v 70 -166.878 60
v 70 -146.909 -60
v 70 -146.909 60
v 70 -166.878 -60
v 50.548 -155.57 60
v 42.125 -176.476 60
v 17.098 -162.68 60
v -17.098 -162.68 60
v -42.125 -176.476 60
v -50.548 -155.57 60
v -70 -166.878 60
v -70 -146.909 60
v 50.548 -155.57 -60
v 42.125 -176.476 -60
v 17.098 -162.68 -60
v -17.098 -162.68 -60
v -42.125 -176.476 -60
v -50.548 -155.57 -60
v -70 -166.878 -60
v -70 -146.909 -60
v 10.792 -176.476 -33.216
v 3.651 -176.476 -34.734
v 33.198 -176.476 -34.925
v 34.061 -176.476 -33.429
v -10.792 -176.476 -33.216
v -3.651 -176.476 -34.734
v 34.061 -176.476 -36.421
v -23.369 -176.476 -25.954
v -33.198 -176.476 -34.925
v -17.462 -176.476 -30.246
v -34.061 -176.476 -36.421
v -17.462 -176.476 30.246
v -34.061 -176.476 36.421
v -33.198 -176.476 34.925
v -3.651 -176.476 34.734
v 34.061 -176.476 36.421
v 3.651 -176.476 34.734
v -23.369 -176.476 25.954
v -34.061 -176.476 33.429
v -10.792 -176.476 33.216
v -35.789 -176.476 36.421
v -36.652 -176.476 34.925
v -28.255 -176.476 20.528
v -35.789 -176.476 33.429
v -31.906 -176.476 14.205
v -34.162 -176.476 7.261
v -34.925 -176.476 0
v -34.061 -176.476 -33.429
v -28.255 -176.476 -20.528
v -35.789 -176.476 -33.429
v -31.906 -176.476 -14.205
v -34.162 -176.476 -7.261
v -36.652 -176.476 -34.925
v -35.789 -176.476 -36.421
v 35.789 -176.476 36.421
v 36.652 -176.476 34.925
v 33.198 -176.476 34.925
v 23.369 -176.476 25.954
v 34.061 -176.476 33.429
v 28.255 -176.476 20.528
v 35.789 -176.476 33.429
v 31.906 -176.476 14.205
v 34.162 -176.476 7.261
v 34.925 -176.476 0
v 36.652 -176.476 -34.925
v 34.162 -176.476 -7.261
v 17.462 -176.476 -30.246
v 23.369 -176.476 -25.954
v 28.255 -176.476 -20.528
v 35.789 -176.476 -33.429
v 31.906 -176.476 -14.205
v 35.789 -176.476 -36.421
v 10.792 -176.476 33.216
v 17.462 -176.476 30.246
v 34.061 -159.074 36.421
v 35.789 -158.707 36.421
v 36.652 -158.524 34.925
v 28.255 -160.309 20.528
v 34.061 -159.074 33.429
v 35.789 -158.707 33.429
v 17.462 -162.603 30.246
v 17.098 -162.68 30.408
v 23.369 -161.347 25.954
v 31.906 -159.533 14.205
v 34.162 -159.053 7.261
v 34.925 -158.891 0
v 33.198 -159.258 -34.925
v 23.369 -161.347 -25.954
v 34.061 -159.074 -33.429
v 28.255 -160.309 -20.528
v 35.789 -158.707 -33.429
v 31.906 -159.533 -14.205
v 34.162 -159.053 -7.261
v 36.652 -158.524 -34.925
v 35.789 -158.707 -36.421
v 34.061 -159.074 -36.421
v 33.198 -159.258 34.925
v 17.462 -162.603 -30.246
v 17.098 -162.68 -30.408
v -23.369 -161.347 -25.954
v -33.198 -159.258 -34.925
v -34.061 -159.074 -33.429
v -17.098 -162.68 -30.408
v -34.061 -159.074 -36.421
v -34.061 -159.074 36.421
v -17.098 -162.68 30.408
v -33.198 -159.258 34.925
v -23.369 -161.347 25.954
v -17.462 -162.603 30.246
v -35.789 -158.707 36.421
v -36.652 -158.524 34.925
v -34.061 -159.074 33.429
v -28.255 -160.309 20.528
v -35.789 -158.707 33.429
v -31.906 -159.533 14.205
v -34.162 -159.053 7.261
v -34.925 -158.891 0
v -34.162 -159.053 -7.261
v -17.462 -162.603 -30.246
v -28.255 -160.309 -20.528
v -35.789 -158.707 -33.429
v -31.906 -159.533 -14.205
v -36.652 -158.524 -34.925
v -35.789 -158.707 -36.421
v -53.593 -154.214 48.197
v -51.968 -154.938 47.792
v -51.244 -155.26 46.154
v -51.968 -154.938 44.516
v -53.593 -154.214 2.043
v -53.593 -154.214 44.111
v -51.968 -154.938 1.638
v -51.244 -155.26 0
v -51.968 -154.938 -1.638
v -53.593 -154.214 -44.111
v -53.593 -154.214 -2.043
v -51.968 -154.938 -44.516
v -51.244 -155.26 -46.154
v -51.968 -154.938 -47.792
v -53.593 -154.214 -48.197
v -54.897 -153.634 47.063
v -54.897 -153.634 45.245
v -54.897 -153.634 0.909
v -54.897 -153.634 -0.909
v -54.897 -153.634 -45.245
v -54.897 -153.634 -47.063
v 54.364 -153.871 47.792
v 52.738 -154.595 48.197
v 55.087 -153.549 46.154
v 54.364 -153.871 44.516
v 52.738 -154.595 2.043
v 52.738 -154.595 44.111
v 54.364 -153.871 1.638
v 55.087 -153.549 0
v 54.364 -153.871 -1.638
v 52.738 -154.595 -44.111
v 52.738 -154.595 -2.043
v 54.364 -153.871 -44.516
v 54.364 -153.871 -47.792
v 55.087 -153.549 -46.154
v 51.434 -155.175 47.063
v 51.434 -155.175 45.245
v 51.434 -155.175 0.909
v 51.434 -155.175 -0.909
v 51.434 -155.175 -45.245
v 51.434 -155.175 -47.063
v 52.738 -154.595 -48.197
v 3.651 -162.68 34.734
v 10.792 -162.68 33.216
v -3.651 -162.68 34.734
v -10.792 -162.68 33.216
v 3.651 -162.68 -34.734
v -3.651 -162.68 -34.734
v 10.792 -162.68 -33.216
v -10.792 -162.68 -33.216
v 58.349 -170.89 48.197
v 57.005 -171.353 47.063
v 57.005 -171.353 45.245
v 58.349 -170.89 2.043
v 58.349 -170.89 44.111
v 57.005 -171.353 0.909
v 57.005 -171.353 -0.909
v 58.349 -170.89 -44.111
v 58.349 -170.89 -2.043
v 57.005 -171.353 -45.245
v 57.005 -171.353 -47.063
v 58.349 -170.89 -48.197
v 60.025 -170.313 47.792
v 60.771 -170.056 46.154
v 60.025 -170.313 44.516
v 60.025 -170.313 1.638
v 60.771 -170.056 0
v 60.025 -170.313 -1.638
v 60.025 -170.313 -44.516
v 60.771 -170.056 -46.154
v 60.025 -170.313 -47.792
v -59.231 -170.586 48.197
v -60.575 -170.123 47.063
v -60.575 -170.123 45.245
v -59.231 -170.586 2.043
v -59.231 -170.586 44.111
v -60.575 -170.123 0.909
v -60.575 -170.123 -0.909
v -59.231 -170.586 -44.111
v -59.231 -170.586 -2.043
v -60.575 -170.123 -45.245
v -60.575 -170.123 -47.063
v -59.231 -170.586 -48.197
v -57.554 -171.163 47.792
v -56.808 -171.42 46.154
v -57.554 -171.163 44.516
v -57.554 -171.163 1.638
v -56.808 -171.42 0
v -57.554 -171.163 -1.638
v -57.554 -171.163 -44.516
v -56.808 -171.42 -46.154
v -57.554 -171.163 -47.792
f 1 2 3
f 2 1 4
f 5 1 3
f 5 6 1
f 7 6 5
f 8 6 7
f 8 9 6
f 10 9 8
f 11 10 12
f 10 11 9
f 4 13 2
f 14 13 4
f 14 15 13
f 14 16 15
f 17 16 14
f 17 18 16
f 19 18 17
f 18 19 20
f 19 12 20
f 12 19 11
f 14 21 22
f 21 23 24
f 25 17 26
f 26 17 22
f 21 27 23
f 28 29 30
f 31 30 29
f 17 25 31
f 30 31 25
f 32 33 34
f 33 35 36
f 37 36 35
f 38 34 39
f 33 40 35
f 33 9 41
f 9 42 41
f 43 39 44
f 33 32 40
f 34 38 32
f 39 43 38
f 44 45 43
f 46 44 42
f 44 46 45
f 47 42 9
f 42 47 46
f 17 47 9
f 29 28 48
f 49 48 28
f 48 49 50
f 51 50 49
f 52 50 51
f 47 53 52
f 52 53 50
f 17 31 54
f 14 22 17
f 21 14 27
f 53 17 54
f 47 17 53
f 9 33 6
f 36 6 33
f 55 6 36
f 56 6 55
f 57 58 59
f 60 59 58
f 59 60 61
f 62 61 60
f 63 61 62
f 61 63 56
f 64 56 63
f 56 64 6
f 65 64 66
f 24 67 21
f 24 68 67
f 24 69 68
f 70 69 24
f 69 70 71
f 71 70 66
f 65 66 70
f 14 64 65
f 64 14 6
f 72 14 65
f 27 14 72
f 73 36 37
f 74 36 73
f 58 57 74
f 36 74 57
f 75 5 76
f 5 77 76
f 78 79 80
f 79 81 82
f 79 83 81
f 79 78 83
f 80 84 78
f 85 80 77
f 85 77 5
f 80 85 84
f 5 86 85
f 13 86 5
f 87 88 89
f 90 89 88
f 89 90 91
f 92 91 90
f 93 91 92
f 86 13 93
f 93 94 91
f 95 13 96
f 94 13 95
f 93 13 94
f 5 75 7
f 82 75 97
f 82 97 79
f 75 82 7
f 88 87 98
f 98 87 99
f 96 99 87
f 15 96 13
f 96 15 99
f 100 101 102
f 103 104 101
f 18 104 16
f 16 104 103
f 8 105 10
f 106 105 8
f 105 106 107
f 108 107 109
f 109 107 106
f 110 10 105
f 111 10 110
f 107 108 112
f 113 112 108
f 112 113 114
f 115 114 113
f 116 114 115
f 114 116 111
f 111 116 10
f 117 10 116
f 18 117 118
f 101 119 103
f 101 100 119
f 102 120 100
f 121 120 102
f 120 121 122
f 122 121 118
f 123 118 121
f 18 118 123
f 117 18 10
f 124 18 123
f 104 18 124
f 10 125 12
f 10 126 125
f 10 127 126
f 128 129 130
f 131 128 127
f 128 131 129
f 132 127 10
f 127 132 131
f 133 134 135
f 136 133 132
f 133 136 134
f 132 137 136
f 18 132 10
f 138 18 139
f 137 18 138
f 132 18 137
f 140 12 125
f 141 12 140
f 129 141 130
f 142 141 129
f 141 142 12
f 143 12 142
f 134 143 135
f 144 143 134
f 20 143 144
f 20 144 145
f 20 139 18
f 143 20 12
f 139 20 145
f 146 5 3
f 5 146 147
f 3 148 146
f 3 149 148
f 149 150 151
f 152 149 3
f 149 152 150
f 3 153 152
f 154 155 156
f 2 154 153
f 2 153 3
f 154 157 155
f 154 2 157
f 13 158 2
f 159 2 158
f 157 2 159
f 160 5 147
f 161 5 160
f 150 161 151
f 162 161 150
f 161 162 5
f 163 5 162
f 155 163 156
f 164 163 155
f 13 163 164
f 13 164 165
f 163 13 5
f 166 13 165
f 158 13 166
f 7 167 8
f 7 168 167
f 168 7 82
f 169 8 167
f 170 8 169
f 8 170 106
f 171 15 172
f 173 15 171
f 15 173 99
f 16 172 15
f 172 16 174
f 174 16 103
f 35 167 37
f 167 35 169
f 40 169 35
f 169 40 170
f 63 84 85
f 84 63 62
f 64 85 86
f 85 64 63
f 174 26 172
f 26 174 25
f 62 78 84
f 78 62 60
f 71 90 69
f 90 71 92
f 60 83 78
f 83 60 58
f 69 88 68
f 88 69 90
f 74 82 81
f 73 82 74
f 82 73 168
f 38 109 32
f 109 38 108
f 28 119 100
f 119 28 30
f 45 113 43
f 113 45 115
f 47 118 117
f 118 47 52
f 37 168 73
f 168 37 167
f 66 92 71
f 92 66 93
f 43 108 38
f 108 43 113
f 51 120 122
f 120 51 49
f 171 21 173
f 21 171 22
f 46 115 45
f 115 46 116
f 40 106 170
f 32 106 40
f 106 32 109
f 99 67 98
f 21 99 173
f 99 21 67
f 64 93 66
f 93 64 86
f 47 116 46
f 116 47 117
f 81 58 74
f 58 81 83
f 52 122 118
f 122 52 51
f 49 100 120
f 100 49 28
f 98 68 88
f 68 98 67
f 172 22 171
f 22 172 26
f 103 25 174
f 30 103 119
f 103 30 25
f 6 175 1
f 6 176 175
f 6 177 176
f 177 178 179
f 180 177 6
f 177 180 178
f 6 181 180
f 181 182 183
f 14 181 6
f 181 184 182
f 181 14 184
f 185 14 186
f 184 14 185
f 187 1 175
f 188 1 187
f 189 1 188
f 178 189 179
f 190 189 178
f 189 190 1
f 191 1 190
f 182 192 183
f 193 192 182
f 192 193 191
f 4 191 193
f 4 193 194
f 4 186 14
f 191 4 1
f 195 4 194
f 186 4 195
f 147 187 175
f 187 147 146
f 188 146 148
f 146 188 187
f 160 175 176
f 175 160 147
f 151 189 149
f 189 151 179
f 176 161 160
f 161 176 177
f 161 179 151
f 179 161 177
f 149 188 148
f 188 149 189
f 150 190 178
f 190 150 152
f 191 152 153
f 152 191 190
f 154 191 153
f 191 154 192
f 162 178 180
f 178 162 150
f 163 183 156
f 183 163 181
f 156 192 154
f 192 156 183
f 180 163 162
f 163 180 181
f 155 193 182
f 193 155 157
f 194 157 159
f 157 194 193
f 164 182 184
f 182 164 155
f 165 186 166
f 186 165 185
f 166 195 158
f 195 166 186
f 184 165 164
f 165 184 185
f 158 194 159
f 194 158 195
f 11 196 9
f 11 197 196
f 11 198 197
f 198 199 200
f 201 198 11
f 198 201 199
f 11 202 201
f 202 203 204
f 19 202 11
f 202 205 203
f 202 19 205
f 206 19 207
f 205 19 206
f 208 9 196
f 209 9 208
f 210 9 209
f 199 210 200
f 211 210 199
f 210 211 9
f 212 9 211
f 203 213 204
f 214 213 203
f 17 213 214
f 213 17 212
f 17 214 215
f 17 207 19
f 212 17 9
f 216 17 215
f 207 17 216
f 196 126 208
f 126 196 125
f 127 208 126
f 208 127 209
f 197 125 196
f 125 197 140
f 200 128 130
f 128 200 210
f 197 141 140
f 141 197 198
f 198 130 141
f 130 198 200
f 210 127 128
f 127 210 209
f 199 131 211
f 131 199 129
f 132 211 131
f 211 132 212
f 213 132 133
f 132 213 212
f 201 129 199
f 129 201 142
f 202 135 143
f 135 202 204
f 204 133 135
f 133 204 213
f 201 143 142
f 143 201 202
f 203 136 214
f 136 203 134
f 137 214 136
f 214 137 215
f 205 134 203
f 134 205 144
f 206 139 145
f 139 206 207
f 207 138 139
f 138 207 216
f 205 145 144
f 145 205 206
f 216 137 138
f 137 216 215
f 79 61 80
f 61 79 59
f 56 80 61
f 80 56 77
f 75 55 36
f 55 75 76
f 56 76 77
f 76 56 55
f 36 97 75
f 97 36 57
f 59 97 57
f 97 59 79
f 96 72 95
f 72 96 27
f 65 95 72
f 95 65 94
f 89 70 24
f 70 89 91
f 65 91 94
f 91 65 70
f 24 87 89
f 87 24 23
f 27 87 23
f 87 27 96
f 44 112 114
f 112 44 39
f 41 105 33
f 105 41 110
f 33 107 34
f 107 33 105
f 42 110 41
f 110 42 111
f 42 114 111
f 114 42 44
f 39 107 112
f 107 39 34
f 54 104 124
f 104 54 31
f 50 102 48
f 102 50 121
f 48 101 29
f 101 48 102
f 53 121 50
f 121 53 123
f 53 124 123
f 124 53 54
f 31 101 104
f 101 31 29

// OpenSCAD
// Base for Spider by 
// 12/14/2020
// Visit erellaz.com for additional documentation and workflow

scale=25.4;    // Inch to mm

//Body
hm=120; //heigth  mm
spacer_width=140; // width in mm
spacer_thickness=18+12; // thickness in mm

//The telescope tube
tubeor=12.88*scale/2;//tube outside radius

// Controls how dip the telecope tube cuts in
shift=17; // to shift the part inside the tube, to control extrusion

//Contol how the corners are cut
shift_corner=-32;
theta=19; // angle for the machine corner. The tube axis is the angle axis.

//Controls screw holes
rhs=0.165*scale/2; // for 8-32 no tapping
rlh=.1360*scale/2; //drill at .1360 to tap for 8-32 screws

//Central hole for focuser
df=2.75*scale;

//Holes for focuser base
ho=scale*2.75/2;

//Resolution for STL export only. That is for display in Openscad and 3D printing only. 
//Please do comment this before going to Freecad, or you will end up with inefficient facets.
// and will not play well with export to .step files
//$fn=400;



module machine_corners(theta){
     rotate([0,0,theta])translate([0,(shift_corner-tubeor),0])union(){
     cube(size = [spacer_width+20,spacer_thickness, hm+20], center = true);
     translate([0,0,hm/2.6]) rotate([90,0,0]) cylinder(h=spacer_thickness*3, r=rhs, center=true);
     translate([0,0,0]) rotate([90,0,0]) cylinder(h=spacer_thickness*3, r=rhs, center=true);
     translate([0,0,-hm/2.6]) rotate([90,0,0]) cylinder(h=spacer_thickness*3, r=rhs, center=true);
     }
}

module focuser_plate_holes(){
    translate([ho,(shift_corner-tubeor),ho]) rotate([90,0,0]) cylinder(h=spacer_thickness*3, r=rlh, center=true);
    translate([ho,(shift_corner-tubeor),-ho]) rotate([90,0,0]) cylinder(h=spacer_thickness*3, r=rlh, center=true);
    translate([-ho,(shift_corner-tubeor),ho]) rotate([90,0,0]) cylinder(h=spacer_thickness*3, r=rlh, center=true);
    translate([-ho,(shift_corner-tubeor),-ho]) rotate([90,0,0]) cylinder(h=spacer_thickness*3, r=rlh, center=true);
    
}
//_________________________________________________________________________________
//main body
difference(){
difference(){
translate([0,(-tubeor+.1+shift-spacer_thickness/2),0])cube(size = [spacer_width,spacer_thickness, hm], center = true);
cylinder(h=hm*2, r=tubeor, center=true);
translate([0,(shift-tubeor-(3*spacer_thickness/2)),0])rotate([90,0,0])cylinder(h=hm*2, r=df/2, center=true);
}

union(){
  machine_corners(theta);
  machine_corners(-theta);
  focuser_plate_holes();
}

}
//_________________________________________________________________________________

//testing the cylinder
if(0){
  color( "red" ) {
     rotate([0,0,theta])translate([0,(shift_corner-tubeor),0])union(){
     cube(size = [spacer_width+20,spacer_thickness, hm+20], center = true);
     translate([0,0,hm/2.6]) rotate([90,0,0]) cylinder(h=spacer_thickness*3, r=rhs, center=true);
     translate([0,0,0]) rotate([90,0,0]) cylinder(h=spacer_thickness*3, r=rhs, center=true);
     translate([0,0,-hm/2.6]) rotate([90,0,0]) cylinder(h=spacer_thickness*3, r=rhs, center=true);
         }
      }
  }
